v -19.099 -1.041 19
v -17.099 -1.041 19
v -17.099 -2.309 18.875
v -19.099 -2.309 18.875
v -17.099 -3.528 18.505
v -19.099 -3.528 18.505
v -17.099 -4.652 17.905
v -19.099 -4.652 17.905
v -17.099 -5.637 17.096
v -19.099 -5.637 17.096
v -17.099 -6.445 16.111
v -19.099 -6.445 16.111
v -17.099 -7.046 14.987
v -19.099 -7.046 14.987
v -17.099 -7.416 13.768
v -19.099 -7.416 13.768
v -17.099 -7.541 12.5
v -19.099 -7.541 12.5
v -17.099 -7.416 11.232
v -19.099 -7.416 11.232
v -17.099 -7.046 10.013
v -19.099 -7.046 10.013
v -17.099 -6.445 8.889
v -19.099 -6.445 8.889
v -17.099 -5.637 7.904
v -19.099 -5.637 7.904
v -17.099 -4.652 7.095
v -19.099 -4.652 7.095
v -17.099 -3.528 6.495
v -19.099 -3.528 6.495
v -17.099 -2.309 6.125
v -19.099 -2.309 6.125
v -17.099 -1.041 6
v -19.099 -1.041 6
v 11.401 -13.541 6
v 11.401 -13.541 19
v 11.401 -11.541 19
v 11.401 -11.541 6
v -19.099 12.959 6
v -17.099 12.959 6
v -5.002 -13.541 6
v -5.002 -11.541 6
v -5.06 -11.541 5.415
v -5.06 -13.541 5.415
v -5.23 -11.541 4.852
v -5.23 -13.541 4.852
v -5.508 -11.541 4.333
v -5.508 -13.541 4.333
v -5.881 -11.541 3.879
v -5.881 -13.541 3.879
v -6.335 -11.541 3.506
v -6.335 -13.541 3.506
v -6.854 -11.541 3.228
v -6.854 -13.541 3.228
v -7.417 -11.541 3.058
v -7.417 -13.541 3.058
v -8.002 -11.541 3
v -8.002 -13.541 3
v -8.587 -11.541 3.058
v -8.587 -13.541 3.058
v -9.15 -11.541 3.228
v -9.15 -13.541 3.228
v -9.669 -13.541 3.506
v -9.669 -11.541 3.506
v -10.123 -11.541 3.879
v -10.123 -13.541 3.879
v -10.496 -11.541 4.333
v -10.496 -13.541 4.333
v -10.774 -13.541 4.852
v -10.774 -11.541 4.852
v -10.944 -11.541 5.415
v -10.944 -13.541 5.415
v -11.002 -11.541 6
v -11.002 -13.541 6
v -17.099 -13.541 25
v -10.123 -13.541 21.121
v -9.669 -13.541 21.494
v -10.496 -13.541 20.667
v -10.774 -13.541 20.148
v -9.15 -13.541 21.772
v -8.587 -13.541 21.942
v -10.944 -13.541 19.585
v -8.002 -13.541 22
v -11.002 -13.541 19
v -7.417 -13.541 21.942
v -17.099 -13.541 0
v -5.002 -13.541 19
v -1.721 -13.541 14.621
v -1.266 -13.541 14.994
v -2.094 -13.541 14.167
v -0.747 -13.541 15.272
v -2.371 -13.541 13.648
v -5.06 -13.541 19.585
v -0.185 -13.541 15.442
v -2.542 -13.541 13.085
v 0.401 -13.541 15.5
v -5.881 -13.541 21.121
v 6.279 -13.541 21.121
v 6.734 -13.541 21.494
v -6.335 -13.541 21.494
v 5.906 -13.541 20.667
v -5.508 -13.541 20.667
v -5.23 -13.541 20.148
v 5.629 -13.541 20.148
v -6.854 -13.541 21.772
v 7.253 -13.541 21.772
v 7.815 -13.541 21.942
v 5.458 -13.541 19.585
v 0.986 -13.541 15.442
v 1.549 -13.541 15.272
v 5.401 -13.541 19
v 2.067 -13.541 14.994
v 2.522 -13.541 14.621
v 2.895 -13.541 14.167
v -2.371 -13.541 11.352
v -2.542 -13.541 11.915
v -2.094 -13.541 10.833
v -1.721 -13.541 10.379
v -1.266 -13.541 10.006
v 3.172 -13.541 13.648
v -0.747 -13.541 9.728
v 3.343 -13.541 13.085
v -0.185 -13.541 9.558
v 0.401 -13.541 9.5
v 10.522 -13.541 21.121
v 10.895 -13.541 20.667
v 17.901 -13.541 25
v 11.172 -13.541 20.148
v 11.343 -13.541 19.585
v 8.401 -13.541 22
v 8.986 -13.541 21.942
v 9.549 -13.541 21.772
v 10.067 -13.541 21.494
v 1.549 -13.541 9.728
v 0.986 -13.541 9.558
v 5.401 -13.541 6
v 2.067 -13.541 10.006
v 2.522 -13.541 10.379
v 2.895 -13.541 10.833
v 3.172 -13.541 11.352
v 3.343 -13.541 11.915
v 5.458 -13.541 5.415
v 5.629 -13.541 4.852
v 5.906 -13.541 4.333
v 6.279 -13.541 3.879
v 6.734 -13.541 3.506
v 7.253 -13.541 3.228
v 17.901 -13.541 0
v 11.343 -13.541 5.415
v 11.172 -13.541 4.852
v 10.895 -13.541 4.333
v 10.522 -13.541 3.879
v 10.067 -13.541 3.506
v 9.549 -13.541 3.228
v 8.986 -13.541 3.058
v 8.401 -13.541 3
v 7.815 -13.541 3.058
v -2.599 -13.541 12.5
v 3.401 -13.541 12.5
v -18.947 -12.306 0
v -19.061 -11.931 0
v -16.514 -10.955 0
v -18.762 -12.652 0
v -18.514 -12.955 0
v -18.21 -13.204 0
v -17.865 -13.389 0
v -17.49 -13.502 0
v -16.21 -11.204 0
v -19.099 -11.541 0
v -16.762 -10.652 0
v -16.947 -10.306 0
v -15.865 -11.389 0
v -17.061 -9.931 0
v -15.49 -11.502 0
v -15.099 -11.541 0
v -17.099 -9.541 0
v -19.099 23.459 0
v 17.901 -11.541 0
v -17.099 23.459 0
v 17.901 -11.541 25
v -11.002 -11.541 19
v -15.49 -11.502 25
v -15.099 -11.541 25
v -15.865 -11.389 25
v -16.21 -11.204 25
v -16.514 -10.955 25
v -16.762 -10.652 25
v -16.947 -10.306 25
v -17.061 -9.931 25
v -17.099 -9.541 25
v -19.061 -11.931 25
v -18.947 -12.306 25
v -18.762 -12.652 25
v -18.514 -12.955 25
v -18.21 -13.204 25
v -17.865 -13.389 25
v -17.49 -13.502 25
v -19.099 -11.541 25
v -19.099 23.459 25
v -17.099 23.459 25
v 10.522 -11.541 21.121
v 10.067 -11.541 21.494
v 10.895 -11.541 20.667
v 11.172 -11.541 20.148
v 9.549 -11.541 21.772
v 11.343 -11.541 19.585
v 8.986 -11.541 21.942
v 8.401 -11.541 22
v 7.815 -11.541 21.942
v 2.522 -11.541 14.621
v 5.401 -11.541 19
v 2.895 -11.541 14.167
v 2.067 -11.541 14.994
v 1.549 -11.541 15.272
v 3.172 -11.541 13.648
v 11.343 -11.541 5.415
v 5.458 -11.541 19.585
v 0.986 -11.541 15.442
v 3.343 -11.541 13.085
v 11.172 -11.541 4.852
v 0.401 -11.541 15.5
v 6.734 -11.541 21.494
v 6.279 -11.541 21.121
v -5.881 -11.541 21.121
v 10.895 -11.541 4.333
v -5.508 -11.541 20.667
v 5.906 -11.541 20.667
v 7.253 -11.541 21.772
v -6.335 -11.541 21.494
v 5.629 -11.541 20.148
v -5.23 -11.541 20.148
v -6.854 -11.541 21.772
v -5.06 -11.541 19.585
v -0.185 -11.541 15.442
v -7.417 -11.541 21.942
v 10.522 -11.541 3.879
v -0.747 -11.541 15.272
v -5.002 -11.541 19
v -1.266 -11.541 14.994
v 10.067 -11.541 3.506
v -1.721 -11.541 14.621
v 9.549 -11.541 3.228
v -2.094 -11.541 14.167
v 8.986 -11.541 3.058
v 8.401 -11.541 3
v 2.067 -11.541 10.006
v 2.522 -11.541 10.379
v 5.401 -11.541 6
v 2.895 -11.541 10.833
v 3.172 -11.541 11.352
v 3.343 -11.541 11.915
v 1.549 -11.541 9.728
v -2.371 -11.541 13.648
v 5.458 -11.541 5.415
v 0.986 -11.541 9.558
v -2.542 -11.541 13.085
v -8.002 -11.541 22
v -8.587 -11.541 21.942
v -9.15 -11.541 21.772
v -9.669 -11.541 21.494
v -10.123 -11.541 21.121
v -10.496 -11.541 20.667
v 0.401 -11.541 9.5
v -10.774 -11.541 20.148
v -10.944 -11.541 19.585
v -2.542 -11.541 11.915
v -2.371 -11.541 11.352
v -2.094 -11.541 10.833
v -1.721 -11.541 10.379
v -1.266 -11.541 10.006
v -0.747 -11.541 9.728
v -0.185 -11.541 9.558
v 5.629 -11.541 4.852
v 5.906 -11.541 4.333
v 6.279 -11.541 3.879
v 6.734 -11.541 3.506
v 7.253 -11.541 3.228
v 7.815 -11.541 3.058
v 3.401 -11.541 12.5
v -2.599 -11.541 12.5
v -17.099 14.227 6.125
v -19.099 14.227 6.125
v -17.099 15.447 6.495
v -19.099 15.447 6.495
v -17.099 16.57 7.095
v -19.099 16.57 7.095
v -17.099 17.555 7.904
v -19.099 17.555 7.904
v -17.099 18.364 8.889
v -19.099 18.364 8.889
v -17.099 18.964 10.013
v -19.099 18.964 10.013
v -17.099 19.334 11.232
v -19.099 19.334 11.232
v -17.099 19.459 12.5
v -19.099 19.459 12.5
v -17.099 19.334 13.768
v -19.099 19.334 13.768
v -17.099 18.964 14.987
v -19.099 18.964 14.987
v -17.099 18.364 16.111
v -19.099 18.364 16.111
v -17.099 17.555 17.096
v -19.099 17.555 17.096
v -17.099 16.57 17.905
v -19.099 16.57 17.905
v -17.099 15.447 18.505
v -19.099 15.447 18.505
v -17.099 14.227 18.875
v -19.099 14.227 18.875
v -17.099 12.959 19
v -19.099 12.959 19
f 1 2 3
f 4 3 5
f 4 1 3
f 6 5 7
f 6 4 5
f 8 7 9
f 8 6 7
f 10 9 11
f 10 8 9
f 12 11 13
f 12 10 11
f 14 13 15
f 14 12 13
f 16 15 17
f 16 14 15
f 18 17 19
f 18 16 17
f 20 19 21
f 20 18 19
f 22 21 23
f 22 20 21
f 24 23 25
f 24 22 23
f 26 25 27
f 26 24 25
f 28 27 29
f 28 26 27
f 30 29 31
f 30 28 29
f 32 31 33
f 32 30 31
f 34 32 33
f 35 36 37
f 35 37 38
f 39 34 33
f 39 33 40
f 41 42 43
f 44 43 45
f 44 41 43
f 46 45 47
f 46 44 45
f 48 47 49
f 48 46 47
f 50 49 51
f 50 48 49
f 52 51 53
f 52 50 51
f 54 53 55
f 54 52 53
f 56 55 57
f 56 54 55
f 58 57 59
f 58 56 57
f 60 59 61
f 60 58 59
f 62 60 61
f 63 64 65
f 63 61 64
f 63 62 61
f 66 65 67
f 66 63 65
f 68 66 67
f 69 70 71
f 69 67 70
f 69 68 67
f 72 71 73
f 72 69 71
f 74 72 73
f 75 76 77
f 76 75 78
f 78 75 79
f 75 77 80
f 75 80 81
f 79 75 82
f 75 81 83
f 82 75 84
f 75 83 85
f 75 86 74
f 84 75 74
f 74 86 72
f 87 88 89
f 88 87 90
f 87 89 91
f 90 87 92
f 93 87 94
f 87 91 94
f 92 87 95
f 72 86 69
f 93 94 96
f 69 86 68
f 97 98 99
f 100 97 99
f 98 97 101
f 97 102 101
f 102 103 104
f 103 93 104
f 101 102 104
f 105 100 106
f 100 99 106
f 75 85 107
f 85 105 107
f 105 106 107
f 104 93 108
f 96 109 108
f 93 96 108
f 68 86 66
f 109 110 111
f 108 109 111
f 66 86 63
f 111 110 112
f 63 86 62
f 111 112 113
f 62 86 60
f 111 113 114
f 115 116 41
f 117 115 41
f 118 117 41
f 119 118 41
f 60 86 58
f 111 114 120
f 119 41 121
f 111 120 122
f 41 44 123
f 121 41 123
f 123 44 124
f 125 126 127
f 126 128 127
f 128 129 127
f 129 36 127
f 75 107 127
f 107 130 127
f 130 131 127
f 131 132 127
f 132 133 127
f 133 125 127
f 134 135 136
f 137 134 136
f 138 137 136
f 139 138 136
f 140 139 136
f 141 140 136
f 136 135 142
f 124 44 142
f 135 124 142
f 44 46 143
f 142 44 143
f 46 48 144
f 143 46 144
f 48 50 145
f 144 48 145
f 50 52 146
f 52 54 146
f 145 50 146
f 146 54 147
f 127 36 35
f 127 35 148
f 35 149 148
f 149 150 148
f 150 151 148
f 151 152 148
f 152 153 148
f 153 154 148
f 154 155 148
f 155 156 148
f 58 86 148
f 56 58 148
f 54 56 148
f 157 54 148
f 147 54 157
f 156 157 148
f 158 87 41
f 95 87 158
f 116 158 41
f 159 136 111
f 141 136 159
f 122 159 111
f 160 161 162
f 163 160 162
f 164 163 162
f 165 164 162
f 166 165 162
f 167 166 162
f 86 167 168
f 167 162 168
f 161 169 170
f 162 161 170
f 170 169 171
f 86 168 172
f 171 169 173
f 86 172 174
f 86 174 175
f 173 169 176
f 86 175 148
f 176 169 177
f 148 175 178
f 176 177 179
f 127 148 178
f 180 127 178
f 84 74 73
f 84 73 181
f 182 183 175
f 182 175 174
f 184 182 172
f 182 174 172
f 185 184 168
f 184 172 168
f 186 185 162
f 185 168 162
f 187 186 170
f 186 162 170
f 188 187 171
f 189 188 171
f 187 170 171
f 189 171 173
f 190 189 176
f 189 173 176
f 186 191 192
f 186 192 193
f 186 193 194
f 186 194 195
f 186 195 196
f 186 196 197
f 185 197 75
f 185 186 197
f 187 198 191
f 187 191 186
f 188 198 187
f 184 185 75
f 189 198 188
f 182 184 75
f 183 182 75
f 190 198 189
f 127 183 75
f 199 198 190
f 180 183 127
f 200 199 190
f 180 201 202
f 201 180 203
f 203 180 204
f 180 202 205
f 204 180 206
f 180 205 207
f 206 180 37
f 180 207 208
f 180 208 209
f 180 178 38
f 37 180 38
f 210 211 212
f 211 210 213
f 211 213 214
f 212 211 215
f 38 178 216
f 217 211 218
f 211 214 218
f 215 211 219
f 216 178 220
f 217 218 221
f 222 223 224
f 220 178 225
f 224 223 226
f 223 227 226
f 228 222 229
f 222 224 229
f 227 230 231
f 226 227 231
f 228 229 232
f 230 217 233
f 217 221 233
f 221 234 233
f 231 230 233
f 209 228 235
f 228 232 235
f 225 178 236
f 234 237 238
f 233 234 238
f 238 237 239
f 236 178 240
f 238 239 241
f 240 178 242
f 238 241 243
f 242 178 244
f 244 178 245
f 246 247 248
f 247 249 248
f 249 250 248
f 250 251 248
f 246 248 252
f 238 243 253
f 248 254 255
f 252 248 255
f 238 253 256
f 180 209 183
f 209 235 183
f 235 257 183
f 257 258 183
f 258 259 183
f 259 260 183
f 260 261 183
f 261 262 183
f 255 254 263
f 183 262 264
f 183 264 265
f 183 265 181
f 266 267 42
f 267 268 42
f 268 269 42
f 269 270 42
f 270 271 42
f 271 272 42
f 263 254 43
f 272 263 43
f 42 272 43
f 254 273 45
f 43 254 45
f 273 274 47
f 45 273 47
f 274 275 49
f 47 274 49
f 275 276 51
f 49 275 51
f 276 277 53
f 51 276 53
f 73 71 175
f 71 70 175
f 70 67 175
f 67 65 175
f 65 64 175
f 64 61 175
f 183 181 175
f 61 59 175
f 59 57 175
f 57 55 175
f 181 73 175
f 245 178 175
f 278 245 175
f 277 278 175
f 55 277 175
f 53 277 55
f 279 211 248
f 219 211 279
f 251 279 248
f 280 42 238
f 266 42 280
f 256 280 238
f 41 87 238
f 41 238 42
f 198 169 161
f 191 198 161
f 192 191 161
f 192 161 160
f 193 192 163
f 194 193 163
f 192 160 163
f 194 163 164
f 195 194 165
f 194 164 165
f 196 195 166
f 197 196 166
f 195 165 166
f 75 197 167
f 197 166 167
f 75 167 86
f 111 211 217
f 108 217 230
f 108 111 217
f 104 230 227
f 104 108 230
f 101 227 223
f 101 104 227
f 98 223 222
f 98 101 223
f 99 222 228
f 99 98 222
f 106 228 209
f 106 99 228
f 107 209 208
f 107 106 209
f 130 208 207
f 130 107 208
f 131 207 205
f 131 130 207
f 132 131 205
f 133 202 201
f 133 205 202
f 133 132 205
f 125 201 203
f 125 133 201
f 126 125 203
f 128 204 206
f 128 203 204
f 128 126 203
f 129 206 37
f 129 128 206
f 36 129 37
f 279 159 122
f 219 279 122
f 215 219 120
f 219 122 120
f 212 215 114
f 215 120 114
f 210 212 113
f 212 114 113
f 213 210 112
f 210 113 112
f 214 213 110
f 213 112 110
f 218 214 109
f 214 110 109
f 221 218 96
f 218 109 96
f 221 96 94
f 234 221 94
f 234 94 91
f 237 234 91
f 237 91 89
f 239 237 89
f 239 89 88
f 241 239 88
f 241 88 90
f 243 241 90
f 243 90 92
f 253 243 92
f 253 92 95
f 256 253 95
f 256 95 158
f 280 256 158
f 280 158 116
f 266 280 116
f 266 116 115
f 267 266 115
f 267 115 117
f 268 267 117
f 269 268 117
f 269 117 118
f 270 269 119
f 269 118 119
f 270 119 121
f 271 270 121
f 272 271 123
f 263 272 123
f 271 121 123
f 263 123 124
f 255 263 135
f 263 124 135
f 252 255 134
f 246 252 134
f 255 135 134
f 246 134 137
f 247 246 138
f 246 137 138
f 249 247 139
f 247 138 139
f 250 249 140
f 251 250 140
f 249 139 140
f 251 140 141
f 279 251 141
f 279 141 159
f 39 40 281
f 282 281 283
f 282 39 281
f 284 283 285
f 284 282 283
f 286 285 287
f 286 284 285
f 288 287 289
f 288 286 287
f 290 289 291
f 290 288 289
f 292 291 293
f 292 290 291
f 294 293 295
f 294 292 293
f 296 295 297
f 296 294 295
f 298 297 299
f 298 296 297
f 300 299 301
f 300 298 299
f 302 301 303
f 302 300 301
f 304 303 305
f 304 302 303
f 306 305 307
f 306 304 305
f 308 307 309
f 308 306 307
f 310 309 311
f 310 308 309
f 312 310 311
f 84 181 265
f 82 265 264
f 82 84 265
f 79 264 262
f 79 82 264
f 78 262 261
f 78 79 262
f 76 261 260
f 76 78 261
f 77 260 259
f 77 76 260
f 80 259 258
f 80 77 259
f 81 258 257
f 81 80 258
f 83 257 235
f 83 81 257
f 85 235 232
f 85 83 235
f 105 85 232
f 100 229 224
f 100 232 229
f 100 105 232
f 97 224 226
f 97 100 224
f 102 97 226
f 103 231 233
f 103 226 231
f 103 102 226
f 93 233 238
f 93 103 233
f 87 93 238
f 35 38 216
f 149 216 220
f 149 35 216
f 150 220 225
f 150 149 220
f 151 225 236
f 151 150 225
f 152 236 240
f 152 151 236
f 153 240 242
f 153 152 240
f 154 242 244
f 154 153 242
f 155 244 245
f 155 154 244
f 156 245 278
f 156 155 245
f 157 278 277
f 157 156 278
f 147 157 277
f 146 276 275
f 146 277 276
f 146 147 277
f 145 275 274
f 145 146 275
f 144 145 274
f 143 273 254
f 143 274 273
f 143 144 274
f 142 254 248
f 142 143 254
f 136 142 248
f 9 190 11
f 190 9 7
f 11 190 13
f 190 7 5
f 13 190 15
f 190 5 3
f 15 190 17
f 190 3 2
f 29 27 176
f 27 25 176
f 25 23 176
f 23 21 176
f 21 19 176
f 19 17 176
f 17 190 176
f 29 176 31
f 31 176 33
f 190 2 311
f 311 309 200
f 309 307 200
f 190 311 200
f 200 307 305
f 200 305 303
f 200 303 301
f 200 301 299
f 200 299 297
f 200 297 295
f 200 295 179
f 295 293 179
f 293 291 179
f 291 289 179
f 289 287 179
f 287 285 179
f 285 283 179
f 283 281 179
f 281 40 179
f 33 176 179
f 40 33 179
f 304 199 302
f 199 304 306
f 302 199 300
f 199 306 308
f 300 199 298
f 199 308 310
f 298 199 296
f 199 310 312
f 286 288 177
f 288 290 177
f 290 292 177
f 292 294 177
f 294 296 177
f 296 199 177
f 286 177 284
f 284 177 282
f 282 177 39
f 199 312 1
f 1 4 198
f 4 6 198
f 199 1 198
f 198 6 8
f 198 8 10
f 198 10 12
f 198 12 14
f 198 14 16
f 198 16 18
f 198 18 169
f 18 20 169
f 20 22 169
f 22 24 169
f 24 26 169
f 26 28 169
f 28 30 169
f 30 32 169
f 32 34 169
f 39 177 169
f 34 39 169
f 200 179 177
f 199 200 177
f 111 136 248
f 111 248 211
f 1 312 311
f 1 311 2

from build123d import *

# Parameters (mm, degrees)
BOSS_EXTRUDE1_DEPTH = 25
CUT_EXTRUDE1_DEPTH  = 25
SKETCH3_R           = 3
CUT_EXTRUDE2_DEPTH  = 25


with BuildPart() as part:
    # Sketch1 → Boss-Extrude1 (new body)
    with BuildSketch(Plane.XY):
        with BuildLine():
            Line((-19.099339108, 23.459186619), (-19.099339108, -11.540813381))
            ThreePointArc((-19.099339108, -11.540813381), (-18.51355267, -12.955026943), (-17.099339108, -13.540813381))
            Line((-17.099339108, -13.540813381), (17.900660892, -13.540813381))
            Line((17.900660892, -13.540813381), (17.900660892, -11.540813381))
            Line((17.900660892, -11.540813381), (-15.099339108, -11.540813381))
            ThreePointArc((-15.099339108, -11.540813381), (-16.51355267, -10.955026943), (-17.099339108, -9.540813381))
            Line((-17.099339108, -9.540813381), (-17.099339108, 23.459186619))
            Line((-17.099339108, 23.459186619), (-19.099339108, 23.459186619))
        make_face()
    extrude(amount=BOSS_EXTRUDE1_DEPTH)

    # Sketch2 → Cut-Extrude1 (cut)
    with BuildSketch(Plane.ZY.offset(19.099339108)):
        with BuildLine():
            Line((6, -1.040813381), (6, 12.959186619))
            ThreePointArc((6, 12.959186619), (12.5, 19.459186619), (19, 12.959186619))
            Line((19, 12.959186619), (19, -1.040813381))
            ThreePointArc((19, -1.040813381), (12.5, -7.540813381), (6, -1.040813381))
        make_face()
    extrude(amount=-CUT_EXTRUDE1_DEPTH, mode=Mode.SUBTRACT)

    # Sketch3 → Cut-Extrude2 (cut)
    with BuildSketch(Plane.XZ.offset(13.540813381)):
        with Locations((0.400660892, 12.5)):
            Circle(SKETCH3_R)
        with BuildLine():
            Line((5.400660892, 6), (5.400660892, 19))
            ThreePointArc((5.400660892, 19), (8.400660892, 22), (11.400660892, 19))
            Line((11.400660892, 19), (11.400660892, 6))
            ThreePointArc((11.400660892, 6), (8.400660892, 3), (5.400660892, 6))
        make_face()
        with BuildLine():
            Line((-11.002045654, 6), (-11.002045654, 19))
            ThreePointArc((-11.002045654, 19), (-8.002045654, 22), (-5.002045654, 19))
            Line((-5.002045654, 19), (-5.002045654, 6))
            ThreePointArc((-5.002045654, 6), (-8.002045654, 3), (-11.002045654, 6))
        make_face()
    extrude(amount=-CUT_EXTRUDE2_DEPTH, mode=Mode.SUBTRACT)


solid = part.part
